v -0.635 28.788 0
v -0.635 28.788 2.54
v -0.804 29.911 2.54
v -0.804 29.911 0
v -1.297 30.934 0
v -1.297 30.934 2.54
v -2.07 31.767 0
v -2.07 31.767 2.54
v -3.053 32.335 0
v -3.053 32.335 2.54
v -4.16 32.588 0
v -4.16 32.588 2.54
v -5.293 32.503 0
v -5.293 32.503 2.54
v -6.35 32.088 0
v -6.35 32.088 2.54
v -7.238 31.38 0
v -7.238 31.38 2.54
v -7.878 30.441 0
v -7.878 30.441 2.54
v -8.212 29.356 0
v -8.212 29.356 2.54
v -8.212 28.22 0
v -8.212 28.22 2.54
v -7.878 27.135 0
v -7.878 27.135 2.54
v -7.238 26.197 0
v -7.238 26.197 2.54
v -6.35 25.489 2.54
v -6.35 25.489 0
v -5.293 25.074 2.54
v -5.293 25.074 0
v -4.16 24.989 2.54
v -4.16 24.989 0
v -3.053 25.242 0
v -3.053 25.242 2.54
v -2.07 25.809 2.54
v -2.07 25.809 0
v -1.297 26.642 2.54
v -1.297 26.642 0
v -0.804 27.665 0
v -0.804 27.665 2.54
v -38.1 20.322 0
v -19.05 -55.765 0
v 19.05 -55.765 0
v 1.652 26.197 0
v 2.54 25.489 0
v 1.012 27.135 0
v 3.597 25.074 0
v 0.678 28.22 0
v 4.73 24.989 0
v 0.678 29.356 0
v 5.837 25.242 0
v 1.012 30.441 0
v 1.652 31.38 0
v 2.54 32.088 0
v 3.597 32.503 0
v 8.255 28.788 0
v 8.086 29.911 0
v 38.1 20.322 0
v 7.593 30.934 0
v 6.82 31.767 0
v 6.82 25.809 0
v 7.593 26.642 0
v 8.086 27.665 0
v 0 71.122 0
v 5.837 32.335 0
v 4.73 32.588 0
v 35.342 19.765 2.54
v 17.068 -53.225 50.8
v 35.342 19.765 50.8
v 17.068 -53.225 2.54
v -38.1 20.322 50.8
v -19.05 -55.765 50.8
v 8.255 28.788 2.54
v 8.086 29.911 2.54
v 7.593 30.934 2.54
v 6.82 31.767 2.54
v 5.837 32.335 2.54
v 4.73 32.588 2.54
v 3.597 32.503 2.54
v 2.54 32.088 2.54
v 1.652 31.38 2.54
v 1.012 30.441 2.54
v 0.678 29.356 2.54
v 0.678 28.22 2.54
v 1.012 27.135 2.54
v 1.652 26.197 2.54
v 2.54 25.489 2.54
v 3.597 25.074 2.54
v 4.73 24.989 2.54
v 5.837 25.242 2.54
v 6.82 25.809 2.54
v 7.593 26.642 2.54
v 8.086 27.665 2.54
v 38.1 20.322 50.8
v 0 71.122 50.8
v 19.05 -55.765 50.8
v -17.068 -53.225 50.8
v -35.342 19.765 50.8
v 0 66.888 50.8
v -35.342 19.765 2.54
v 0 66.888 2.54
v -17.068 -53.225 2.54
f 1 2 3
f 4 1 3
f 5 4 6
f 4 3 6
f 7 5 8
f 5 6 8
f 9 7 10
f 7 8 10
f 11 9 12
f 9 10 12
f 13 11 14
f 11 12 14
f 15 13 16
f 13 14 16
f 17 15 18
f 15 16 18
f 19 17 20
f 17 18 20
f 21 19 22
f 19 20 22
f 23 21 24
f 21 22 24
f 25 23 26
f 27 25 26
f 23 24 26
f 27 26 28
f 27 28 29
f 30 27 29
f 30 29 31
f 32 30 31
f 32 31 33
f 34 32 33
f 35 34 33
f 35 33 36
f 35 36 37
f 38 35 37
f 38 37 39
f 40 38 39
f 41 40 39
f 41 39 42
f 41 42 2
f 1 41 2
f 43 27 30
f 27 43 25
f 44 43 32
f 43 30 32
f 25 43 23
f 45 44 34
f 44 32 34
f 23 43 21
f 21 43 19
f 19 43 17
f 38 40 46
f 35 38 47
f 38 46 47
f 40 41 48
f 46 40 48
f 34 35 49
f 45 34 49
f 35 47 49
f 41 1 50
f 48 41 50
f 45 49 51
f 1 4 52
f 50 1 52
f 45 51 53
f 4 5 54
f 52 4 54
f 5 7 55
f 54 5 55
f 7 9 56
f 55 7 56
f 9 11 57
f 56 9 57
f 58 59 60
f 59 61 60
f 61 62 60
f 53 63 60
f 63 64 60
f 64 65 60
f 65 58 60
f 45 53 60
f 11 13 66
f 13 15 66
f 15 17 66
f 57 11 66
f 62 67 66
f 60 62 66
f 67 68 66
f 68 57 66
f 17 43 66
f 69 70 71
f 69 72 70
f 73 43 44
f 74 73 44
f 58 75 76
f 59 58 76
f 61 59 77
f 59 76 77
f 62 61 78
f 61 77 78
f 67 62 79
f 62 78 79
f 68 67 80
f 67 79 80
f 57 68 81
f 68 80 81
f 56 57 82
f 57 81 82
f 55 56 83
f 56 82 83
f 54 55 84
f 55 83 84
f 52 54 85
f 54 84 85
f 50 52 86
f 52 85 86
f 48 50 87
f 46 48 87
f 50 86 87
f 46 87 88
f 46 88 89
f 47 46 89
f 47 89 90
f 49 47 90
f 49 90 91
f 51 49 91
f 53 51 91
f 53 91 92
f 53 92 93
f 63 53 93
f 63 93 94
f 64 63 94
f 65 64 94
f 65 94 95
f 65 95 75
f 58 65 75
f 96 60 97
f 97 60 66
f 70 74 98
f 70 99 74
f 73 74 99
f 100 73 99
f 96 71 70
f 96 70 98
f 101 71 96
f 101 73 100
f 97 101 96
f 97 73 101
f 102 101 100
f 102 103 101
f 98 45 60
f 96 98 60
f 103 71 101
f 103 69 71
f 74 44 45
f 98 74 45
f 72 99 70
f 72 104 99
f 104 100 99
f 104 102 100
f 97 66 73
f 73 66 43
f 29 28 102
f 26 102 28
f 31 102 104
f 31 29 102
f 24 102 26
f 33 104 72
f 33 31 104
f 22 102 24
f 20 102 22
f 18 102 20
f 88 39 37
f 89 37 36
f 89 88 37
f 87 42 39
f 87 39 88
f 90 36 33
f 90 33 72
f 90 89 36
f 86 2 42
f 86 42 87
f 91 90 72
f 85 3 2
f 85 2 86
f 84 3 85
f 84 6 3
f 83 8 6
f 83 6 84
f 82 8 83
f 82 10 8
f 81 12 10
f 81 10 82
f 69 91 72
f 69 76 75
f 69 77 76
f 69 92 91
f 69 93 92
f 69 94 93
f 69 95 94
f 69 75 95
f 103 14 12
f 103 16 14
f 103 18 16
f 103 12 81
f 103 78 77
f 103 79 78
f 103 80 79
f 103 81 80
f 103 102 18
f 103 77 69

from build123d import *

# Parameters (mm, degrees)
F1_DEPTH = 50.8
F2_T     = -2.54
F3_R     = 3.81
F4_DEPTH = 25.4


with BuildPart() as f1:
    # F0 (on Top) → F1 (new body)
    with BuildSketch(Plane.XY):
        Polygon((0, -55.765115), (0, 20.321534), (-38.1, 20.321534), (-19.05, -55.765115), align=None)
        Polygon((38.1, 20.321534), (0, 20.321534), (0, -55.765115), (19.05, -55.765115), align=None)
        Polygon((38.1, 20.321534), (0, 71.121534), (0, 20.321534), align=None)
        Polygon((0, 20.321534), (0, 71.121534), (-38.1, 20.321534), align=None)
    extrude(amount=F1_DEPTH)

    # F2
    f2_openings = [f1.faces().sort_by_distance(p)[0] for p in [
        (0, 2.136611, 50.8),
    ]]
    offset(amount=F2_T, openings=f2_openings)

    # F3 (on face) → F4 (cut)
    with BuildSketch(Plane.XY.offset(2.54)):
        with Locations((4.445, 28.7882)):
            Circle(F3_R)
        with Locations((-4.445, 28.7882)):
            Circle(F3_R)
    extrude(amount=-F4_DEPTH, mode=Mode.SUBTRACT)


solid = f1.part
